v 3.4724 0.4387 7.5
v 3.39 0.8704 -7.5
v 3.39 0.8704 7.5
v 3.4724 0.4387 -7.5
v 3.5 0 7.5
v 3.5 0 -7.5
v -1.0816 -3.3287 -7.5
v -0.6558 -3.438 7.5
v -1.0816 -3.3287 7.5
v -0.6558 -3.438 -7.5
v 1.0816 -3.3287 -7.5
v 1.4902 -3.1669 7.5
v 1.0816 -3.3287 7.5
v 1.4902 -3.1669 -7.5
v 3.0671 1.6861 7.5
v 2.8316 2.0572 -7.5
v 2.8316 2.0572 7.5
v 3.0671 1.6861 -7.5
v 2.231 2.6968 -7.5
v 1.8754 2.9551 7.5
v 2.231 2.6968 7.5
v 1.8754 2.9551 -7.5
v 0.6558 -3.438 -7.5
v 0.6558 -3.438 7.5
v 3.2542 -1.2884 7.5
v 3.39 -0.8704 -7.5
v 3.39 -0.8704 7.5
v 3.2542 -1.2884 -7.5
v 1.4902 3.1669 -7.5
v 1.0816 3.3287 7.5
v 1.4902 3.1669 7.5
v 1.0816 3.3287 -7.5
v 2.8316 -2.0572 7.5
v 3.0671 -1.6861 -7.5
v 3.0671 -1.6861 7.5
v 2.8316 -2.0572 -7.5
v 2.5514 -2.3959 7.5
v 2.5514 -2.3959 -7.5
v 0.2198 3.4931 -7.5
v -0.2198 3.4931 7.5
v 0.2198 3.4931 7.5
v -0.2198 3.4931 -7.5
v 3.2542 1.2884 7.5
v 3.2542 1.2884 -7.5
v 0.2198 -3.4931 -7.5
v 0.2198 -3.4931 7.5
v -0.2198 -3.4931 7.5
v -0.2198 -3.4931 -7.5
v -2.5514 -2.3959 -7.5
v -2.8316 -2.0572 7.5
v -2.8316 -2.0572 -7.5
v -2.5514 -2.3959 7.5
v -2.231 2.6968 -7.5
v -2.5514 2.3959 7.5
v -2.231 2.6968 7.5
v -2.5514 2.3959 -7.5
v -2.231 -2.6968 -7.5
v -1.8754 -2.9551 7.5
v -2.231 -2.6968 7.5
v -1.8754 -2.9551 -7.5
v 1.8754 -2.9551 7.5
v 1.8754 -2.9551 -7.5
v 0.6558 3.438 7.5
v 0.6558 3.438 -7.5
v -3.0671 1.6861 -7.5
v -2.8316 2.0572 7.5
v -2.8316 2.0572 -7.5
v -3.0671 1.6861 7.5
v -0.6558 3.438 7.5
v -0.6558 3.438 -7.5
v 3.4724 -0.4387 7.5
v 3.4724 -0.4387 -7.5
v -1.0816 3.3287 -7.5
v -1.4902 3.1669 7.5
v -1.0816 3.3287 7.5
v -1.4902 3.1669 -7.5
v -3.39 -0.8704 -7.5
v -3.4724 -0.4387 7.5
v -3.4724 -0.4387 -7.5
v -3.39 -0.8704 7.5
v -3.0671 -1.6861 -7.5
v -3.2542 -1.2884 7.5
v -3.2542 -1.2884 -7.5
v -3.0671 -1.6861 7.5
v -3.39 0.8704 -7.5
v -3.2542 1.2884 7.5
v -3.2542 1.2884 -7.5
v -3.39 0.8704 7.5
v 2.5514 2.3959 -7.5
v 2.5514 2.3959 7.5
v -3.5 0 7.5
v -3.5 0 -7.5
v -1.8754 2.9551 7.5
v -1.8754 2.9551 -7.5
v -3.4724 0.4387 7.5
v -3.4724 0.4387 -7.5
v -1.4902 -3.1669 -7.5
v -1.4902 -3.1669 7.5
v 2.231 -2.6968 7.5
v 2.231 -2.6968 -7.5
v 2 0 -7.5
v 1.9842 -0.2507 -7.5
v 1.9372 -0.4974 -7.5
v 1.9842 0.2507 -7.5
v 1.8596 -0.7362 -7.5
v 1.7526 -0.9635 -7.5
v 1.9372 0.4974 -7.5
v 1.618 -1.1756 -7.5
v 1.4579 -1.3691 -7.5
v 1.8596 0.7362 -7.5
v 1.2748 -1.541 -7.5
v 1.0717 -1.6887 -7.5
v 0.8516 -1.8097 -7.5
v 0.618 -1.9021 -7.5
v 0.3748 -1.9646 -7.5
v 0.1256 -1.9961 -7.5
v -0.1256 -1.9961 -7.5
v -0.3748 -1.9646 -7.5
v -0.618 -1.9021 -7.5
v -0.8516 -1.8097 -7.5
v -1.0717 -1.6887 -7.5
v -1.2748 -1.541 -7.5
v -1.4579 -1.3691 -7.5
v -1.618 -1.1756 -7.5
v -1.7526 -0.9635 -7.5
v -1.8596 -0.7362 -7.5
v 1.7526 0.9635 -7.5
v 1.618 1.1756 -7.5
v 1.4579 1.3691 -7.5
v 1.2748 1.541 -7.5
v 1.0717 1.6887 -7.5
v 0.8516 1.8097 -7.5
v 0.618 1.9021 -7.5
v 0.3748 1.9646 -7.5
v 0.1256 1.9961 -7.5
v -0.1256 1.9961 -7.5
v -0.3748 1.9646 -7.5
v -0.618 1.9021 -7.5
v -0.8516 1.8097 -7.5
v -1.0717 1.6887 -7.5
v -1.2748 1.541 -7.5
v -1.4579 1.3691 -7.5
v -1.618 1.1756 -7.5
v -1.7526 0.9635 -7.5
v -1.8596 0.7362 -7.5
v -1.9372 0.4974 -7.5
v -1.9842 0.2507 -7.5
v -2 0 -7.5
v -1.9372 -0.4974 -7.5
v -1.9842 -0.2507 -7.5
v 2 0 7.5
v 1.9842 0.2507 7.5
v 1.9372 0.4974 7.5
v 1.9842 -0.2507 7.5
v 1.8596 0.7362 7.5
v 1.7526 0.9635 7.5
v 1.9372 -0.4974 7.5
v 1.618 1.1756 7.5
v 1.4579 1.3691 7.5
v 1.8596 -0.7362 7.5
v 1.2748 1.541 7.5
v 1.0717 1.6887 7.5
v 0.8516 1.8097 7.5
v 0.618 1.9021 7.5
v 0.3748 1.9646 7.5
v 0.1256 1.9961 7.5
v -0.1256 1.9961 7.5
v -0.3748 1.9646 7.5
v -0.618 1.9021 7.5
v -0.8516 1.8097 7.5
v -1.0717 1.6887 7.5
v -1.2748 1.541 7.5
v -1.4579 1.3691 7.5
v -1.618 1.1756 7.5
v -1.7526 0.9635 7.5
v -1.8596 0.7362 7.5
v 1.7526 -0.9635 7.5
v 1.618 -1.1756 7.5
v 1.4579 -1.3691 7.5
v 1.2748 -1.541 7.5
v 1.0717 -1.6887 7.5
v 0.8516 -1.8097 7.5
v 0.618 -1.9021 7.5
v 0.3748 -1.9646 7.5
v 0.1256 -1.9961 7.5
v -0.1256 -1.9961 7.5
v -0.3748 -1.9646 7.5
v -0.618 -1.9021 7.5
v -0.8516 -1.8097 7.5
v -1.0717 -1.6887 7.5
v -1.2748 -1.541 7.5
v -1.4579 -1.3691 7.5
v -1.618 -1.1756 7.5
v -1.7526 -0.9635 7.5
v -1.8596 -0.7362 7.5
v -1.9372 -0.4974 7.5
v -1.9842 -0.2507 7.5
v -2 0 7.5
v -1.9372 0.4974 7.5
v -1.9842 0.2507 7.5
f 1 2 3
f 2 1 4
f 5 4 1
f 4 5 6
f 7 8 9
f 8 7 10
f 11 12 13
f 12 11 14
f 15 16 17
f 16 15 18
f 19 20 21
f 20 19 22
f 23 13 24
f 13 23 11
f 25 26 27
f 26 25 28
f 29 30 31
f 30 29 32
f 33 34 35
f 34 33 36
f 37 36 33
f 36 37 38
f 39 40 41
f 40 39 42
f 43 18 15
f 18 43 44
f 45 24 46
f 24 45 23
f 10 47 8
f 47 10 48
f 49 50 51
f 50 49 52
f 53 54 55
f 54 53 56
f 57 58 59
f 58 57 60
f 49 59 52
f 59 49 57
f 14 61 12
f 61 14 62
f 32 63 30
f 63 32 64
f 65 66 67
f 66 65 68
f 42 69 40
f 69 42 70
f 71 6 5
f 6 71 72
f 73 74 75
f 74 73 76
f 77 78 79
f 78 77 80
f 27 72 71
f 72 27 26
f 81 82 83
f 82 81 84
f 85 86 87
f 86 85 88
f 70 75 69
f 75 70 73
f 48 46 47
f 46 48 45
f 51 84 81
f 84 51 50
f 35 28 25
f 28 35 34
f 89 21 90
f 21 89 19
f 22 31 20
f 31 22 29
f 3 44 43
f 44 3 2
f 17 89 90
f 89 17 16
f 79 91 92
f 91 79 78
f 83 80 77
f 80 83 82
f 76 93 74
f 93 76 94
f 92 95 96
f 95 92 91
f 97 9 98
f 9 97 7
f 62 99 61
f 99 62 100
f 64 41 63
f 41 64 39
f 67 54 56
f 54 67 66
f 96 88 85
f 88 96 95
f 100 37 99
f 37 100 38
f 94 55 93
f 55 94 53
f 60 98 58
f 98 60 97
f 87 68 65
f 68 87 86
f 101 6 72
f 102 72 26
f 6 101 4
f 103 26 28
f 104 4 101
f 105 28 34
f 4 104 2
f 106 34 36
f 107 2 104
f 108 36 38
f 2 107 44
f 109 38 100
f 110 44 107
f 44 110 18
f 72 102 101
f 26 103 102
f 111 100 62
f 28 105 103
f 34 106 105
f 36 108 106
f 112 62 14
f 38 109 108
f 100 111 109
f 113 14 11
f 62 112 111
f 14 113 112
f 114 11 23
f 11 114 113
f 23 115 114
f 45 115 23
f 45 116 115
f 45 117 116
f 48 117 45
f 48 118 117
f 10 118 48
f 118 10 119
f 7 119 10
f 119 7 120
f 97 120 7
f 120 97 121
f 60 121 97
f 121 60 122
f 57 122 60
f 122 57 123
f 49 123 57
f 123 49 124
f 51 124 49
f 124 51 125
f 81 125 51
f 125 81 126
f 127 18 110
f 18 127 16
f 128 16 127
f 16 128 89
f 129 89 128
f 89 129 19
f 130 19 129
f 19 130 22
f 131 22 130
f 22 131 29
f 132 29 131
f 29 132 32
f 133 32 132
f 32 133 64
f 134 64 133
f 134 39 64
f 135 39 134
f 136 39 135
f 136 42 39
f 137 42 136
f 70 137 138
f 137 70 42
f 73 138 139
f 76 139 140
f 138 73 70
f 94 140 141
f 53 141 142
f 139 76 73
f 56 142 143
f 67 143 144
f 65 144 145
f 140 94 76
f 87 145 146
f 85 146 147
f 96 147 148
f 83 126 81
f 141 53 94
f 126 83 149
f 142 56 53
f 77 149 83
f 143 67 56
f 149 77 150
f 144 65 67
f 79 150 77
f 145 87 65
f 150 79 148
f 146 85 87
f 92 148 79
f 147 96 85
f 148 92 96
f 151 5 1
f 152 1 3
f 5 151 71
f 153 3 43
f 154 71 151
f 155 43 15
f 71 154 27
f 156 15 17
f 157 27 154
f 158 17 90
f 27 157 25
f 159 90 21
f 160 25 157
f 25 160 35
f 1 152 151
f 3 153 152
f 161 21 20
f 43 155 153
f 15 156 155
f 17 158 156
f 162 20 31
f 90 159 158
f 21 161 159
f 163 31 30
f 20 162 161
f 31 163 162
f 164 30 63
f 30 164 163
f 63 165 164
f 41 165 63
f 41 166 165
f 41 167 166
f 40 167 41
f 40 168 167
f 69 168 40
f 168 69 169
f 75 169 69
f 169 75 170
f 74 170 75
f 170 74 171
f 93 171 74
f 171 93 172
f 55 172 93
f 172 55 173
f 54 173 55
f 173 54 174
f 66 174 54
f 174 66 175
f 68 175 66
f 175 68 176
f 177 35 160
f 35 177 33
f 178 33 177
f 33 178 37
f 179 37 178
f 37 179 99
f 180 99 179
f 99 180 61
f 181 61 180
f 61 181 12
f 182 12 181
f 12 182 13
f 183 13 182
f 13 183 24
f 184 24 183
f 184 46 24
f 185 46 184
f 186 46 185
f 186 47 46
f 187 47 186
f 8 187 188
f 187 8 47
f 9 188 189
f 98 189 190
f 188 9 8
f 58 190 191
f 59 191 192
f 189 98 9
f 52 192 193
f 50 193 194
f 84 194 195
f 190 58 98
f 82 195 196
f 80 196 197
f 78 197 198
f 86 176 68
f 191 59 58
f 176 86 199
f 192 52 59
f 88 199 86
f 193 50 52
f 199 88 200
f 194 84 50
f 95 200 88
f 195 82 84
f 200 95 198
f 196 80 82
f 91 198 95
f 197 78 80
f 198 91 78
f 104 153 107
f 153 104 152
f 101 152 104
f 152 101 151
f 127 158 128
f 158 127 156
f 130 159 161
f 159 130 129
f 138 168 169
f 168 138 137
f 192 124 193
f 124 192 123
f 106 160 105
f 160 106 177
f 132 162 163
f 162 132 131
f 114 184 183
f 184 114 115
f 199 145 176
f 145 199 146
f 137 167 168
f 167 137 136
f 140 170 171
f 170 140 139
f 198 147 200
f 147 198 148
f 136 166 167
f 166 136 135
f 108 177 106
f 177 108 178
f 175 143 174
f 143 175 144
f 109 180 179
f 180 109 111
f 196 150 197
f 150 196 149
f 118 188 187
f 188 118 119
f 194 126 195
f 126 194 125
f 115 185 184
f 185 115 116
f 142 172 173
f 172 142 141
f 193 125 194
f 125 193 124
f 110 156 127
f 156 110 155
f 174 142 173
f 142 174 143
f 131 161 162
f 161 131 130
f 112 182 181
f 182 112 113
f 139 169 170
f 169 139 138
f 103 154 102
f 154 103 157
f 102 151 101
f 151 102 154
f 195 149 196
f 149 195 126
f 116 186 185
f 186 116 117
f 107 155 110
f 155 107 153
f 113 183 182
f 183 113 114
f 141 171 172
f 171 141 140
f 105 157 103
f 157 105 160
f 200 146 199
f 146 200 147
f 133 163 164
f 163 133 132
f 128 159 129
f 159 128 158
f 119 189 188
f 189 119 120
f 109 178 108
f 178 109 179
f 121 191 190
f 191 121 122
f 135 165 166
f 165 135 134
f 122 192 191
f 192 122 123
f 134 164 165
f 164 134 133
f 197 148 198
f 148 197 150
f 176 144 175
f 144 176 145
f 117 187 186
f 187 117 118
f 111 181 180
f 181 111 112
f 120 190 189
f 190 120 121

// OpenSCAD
$fn = 50;


difference() {
	union() {
		translate(v = [0, 0, -7.5000000000]) {
			cylinder(h = 15, r = 3.5000000000);
		}
	}
	union() {
		translate(v = [0, 0, -100.0000000000]) {
			cylinder(h = 200, r = 2.0000000000);
		}
	}
}
